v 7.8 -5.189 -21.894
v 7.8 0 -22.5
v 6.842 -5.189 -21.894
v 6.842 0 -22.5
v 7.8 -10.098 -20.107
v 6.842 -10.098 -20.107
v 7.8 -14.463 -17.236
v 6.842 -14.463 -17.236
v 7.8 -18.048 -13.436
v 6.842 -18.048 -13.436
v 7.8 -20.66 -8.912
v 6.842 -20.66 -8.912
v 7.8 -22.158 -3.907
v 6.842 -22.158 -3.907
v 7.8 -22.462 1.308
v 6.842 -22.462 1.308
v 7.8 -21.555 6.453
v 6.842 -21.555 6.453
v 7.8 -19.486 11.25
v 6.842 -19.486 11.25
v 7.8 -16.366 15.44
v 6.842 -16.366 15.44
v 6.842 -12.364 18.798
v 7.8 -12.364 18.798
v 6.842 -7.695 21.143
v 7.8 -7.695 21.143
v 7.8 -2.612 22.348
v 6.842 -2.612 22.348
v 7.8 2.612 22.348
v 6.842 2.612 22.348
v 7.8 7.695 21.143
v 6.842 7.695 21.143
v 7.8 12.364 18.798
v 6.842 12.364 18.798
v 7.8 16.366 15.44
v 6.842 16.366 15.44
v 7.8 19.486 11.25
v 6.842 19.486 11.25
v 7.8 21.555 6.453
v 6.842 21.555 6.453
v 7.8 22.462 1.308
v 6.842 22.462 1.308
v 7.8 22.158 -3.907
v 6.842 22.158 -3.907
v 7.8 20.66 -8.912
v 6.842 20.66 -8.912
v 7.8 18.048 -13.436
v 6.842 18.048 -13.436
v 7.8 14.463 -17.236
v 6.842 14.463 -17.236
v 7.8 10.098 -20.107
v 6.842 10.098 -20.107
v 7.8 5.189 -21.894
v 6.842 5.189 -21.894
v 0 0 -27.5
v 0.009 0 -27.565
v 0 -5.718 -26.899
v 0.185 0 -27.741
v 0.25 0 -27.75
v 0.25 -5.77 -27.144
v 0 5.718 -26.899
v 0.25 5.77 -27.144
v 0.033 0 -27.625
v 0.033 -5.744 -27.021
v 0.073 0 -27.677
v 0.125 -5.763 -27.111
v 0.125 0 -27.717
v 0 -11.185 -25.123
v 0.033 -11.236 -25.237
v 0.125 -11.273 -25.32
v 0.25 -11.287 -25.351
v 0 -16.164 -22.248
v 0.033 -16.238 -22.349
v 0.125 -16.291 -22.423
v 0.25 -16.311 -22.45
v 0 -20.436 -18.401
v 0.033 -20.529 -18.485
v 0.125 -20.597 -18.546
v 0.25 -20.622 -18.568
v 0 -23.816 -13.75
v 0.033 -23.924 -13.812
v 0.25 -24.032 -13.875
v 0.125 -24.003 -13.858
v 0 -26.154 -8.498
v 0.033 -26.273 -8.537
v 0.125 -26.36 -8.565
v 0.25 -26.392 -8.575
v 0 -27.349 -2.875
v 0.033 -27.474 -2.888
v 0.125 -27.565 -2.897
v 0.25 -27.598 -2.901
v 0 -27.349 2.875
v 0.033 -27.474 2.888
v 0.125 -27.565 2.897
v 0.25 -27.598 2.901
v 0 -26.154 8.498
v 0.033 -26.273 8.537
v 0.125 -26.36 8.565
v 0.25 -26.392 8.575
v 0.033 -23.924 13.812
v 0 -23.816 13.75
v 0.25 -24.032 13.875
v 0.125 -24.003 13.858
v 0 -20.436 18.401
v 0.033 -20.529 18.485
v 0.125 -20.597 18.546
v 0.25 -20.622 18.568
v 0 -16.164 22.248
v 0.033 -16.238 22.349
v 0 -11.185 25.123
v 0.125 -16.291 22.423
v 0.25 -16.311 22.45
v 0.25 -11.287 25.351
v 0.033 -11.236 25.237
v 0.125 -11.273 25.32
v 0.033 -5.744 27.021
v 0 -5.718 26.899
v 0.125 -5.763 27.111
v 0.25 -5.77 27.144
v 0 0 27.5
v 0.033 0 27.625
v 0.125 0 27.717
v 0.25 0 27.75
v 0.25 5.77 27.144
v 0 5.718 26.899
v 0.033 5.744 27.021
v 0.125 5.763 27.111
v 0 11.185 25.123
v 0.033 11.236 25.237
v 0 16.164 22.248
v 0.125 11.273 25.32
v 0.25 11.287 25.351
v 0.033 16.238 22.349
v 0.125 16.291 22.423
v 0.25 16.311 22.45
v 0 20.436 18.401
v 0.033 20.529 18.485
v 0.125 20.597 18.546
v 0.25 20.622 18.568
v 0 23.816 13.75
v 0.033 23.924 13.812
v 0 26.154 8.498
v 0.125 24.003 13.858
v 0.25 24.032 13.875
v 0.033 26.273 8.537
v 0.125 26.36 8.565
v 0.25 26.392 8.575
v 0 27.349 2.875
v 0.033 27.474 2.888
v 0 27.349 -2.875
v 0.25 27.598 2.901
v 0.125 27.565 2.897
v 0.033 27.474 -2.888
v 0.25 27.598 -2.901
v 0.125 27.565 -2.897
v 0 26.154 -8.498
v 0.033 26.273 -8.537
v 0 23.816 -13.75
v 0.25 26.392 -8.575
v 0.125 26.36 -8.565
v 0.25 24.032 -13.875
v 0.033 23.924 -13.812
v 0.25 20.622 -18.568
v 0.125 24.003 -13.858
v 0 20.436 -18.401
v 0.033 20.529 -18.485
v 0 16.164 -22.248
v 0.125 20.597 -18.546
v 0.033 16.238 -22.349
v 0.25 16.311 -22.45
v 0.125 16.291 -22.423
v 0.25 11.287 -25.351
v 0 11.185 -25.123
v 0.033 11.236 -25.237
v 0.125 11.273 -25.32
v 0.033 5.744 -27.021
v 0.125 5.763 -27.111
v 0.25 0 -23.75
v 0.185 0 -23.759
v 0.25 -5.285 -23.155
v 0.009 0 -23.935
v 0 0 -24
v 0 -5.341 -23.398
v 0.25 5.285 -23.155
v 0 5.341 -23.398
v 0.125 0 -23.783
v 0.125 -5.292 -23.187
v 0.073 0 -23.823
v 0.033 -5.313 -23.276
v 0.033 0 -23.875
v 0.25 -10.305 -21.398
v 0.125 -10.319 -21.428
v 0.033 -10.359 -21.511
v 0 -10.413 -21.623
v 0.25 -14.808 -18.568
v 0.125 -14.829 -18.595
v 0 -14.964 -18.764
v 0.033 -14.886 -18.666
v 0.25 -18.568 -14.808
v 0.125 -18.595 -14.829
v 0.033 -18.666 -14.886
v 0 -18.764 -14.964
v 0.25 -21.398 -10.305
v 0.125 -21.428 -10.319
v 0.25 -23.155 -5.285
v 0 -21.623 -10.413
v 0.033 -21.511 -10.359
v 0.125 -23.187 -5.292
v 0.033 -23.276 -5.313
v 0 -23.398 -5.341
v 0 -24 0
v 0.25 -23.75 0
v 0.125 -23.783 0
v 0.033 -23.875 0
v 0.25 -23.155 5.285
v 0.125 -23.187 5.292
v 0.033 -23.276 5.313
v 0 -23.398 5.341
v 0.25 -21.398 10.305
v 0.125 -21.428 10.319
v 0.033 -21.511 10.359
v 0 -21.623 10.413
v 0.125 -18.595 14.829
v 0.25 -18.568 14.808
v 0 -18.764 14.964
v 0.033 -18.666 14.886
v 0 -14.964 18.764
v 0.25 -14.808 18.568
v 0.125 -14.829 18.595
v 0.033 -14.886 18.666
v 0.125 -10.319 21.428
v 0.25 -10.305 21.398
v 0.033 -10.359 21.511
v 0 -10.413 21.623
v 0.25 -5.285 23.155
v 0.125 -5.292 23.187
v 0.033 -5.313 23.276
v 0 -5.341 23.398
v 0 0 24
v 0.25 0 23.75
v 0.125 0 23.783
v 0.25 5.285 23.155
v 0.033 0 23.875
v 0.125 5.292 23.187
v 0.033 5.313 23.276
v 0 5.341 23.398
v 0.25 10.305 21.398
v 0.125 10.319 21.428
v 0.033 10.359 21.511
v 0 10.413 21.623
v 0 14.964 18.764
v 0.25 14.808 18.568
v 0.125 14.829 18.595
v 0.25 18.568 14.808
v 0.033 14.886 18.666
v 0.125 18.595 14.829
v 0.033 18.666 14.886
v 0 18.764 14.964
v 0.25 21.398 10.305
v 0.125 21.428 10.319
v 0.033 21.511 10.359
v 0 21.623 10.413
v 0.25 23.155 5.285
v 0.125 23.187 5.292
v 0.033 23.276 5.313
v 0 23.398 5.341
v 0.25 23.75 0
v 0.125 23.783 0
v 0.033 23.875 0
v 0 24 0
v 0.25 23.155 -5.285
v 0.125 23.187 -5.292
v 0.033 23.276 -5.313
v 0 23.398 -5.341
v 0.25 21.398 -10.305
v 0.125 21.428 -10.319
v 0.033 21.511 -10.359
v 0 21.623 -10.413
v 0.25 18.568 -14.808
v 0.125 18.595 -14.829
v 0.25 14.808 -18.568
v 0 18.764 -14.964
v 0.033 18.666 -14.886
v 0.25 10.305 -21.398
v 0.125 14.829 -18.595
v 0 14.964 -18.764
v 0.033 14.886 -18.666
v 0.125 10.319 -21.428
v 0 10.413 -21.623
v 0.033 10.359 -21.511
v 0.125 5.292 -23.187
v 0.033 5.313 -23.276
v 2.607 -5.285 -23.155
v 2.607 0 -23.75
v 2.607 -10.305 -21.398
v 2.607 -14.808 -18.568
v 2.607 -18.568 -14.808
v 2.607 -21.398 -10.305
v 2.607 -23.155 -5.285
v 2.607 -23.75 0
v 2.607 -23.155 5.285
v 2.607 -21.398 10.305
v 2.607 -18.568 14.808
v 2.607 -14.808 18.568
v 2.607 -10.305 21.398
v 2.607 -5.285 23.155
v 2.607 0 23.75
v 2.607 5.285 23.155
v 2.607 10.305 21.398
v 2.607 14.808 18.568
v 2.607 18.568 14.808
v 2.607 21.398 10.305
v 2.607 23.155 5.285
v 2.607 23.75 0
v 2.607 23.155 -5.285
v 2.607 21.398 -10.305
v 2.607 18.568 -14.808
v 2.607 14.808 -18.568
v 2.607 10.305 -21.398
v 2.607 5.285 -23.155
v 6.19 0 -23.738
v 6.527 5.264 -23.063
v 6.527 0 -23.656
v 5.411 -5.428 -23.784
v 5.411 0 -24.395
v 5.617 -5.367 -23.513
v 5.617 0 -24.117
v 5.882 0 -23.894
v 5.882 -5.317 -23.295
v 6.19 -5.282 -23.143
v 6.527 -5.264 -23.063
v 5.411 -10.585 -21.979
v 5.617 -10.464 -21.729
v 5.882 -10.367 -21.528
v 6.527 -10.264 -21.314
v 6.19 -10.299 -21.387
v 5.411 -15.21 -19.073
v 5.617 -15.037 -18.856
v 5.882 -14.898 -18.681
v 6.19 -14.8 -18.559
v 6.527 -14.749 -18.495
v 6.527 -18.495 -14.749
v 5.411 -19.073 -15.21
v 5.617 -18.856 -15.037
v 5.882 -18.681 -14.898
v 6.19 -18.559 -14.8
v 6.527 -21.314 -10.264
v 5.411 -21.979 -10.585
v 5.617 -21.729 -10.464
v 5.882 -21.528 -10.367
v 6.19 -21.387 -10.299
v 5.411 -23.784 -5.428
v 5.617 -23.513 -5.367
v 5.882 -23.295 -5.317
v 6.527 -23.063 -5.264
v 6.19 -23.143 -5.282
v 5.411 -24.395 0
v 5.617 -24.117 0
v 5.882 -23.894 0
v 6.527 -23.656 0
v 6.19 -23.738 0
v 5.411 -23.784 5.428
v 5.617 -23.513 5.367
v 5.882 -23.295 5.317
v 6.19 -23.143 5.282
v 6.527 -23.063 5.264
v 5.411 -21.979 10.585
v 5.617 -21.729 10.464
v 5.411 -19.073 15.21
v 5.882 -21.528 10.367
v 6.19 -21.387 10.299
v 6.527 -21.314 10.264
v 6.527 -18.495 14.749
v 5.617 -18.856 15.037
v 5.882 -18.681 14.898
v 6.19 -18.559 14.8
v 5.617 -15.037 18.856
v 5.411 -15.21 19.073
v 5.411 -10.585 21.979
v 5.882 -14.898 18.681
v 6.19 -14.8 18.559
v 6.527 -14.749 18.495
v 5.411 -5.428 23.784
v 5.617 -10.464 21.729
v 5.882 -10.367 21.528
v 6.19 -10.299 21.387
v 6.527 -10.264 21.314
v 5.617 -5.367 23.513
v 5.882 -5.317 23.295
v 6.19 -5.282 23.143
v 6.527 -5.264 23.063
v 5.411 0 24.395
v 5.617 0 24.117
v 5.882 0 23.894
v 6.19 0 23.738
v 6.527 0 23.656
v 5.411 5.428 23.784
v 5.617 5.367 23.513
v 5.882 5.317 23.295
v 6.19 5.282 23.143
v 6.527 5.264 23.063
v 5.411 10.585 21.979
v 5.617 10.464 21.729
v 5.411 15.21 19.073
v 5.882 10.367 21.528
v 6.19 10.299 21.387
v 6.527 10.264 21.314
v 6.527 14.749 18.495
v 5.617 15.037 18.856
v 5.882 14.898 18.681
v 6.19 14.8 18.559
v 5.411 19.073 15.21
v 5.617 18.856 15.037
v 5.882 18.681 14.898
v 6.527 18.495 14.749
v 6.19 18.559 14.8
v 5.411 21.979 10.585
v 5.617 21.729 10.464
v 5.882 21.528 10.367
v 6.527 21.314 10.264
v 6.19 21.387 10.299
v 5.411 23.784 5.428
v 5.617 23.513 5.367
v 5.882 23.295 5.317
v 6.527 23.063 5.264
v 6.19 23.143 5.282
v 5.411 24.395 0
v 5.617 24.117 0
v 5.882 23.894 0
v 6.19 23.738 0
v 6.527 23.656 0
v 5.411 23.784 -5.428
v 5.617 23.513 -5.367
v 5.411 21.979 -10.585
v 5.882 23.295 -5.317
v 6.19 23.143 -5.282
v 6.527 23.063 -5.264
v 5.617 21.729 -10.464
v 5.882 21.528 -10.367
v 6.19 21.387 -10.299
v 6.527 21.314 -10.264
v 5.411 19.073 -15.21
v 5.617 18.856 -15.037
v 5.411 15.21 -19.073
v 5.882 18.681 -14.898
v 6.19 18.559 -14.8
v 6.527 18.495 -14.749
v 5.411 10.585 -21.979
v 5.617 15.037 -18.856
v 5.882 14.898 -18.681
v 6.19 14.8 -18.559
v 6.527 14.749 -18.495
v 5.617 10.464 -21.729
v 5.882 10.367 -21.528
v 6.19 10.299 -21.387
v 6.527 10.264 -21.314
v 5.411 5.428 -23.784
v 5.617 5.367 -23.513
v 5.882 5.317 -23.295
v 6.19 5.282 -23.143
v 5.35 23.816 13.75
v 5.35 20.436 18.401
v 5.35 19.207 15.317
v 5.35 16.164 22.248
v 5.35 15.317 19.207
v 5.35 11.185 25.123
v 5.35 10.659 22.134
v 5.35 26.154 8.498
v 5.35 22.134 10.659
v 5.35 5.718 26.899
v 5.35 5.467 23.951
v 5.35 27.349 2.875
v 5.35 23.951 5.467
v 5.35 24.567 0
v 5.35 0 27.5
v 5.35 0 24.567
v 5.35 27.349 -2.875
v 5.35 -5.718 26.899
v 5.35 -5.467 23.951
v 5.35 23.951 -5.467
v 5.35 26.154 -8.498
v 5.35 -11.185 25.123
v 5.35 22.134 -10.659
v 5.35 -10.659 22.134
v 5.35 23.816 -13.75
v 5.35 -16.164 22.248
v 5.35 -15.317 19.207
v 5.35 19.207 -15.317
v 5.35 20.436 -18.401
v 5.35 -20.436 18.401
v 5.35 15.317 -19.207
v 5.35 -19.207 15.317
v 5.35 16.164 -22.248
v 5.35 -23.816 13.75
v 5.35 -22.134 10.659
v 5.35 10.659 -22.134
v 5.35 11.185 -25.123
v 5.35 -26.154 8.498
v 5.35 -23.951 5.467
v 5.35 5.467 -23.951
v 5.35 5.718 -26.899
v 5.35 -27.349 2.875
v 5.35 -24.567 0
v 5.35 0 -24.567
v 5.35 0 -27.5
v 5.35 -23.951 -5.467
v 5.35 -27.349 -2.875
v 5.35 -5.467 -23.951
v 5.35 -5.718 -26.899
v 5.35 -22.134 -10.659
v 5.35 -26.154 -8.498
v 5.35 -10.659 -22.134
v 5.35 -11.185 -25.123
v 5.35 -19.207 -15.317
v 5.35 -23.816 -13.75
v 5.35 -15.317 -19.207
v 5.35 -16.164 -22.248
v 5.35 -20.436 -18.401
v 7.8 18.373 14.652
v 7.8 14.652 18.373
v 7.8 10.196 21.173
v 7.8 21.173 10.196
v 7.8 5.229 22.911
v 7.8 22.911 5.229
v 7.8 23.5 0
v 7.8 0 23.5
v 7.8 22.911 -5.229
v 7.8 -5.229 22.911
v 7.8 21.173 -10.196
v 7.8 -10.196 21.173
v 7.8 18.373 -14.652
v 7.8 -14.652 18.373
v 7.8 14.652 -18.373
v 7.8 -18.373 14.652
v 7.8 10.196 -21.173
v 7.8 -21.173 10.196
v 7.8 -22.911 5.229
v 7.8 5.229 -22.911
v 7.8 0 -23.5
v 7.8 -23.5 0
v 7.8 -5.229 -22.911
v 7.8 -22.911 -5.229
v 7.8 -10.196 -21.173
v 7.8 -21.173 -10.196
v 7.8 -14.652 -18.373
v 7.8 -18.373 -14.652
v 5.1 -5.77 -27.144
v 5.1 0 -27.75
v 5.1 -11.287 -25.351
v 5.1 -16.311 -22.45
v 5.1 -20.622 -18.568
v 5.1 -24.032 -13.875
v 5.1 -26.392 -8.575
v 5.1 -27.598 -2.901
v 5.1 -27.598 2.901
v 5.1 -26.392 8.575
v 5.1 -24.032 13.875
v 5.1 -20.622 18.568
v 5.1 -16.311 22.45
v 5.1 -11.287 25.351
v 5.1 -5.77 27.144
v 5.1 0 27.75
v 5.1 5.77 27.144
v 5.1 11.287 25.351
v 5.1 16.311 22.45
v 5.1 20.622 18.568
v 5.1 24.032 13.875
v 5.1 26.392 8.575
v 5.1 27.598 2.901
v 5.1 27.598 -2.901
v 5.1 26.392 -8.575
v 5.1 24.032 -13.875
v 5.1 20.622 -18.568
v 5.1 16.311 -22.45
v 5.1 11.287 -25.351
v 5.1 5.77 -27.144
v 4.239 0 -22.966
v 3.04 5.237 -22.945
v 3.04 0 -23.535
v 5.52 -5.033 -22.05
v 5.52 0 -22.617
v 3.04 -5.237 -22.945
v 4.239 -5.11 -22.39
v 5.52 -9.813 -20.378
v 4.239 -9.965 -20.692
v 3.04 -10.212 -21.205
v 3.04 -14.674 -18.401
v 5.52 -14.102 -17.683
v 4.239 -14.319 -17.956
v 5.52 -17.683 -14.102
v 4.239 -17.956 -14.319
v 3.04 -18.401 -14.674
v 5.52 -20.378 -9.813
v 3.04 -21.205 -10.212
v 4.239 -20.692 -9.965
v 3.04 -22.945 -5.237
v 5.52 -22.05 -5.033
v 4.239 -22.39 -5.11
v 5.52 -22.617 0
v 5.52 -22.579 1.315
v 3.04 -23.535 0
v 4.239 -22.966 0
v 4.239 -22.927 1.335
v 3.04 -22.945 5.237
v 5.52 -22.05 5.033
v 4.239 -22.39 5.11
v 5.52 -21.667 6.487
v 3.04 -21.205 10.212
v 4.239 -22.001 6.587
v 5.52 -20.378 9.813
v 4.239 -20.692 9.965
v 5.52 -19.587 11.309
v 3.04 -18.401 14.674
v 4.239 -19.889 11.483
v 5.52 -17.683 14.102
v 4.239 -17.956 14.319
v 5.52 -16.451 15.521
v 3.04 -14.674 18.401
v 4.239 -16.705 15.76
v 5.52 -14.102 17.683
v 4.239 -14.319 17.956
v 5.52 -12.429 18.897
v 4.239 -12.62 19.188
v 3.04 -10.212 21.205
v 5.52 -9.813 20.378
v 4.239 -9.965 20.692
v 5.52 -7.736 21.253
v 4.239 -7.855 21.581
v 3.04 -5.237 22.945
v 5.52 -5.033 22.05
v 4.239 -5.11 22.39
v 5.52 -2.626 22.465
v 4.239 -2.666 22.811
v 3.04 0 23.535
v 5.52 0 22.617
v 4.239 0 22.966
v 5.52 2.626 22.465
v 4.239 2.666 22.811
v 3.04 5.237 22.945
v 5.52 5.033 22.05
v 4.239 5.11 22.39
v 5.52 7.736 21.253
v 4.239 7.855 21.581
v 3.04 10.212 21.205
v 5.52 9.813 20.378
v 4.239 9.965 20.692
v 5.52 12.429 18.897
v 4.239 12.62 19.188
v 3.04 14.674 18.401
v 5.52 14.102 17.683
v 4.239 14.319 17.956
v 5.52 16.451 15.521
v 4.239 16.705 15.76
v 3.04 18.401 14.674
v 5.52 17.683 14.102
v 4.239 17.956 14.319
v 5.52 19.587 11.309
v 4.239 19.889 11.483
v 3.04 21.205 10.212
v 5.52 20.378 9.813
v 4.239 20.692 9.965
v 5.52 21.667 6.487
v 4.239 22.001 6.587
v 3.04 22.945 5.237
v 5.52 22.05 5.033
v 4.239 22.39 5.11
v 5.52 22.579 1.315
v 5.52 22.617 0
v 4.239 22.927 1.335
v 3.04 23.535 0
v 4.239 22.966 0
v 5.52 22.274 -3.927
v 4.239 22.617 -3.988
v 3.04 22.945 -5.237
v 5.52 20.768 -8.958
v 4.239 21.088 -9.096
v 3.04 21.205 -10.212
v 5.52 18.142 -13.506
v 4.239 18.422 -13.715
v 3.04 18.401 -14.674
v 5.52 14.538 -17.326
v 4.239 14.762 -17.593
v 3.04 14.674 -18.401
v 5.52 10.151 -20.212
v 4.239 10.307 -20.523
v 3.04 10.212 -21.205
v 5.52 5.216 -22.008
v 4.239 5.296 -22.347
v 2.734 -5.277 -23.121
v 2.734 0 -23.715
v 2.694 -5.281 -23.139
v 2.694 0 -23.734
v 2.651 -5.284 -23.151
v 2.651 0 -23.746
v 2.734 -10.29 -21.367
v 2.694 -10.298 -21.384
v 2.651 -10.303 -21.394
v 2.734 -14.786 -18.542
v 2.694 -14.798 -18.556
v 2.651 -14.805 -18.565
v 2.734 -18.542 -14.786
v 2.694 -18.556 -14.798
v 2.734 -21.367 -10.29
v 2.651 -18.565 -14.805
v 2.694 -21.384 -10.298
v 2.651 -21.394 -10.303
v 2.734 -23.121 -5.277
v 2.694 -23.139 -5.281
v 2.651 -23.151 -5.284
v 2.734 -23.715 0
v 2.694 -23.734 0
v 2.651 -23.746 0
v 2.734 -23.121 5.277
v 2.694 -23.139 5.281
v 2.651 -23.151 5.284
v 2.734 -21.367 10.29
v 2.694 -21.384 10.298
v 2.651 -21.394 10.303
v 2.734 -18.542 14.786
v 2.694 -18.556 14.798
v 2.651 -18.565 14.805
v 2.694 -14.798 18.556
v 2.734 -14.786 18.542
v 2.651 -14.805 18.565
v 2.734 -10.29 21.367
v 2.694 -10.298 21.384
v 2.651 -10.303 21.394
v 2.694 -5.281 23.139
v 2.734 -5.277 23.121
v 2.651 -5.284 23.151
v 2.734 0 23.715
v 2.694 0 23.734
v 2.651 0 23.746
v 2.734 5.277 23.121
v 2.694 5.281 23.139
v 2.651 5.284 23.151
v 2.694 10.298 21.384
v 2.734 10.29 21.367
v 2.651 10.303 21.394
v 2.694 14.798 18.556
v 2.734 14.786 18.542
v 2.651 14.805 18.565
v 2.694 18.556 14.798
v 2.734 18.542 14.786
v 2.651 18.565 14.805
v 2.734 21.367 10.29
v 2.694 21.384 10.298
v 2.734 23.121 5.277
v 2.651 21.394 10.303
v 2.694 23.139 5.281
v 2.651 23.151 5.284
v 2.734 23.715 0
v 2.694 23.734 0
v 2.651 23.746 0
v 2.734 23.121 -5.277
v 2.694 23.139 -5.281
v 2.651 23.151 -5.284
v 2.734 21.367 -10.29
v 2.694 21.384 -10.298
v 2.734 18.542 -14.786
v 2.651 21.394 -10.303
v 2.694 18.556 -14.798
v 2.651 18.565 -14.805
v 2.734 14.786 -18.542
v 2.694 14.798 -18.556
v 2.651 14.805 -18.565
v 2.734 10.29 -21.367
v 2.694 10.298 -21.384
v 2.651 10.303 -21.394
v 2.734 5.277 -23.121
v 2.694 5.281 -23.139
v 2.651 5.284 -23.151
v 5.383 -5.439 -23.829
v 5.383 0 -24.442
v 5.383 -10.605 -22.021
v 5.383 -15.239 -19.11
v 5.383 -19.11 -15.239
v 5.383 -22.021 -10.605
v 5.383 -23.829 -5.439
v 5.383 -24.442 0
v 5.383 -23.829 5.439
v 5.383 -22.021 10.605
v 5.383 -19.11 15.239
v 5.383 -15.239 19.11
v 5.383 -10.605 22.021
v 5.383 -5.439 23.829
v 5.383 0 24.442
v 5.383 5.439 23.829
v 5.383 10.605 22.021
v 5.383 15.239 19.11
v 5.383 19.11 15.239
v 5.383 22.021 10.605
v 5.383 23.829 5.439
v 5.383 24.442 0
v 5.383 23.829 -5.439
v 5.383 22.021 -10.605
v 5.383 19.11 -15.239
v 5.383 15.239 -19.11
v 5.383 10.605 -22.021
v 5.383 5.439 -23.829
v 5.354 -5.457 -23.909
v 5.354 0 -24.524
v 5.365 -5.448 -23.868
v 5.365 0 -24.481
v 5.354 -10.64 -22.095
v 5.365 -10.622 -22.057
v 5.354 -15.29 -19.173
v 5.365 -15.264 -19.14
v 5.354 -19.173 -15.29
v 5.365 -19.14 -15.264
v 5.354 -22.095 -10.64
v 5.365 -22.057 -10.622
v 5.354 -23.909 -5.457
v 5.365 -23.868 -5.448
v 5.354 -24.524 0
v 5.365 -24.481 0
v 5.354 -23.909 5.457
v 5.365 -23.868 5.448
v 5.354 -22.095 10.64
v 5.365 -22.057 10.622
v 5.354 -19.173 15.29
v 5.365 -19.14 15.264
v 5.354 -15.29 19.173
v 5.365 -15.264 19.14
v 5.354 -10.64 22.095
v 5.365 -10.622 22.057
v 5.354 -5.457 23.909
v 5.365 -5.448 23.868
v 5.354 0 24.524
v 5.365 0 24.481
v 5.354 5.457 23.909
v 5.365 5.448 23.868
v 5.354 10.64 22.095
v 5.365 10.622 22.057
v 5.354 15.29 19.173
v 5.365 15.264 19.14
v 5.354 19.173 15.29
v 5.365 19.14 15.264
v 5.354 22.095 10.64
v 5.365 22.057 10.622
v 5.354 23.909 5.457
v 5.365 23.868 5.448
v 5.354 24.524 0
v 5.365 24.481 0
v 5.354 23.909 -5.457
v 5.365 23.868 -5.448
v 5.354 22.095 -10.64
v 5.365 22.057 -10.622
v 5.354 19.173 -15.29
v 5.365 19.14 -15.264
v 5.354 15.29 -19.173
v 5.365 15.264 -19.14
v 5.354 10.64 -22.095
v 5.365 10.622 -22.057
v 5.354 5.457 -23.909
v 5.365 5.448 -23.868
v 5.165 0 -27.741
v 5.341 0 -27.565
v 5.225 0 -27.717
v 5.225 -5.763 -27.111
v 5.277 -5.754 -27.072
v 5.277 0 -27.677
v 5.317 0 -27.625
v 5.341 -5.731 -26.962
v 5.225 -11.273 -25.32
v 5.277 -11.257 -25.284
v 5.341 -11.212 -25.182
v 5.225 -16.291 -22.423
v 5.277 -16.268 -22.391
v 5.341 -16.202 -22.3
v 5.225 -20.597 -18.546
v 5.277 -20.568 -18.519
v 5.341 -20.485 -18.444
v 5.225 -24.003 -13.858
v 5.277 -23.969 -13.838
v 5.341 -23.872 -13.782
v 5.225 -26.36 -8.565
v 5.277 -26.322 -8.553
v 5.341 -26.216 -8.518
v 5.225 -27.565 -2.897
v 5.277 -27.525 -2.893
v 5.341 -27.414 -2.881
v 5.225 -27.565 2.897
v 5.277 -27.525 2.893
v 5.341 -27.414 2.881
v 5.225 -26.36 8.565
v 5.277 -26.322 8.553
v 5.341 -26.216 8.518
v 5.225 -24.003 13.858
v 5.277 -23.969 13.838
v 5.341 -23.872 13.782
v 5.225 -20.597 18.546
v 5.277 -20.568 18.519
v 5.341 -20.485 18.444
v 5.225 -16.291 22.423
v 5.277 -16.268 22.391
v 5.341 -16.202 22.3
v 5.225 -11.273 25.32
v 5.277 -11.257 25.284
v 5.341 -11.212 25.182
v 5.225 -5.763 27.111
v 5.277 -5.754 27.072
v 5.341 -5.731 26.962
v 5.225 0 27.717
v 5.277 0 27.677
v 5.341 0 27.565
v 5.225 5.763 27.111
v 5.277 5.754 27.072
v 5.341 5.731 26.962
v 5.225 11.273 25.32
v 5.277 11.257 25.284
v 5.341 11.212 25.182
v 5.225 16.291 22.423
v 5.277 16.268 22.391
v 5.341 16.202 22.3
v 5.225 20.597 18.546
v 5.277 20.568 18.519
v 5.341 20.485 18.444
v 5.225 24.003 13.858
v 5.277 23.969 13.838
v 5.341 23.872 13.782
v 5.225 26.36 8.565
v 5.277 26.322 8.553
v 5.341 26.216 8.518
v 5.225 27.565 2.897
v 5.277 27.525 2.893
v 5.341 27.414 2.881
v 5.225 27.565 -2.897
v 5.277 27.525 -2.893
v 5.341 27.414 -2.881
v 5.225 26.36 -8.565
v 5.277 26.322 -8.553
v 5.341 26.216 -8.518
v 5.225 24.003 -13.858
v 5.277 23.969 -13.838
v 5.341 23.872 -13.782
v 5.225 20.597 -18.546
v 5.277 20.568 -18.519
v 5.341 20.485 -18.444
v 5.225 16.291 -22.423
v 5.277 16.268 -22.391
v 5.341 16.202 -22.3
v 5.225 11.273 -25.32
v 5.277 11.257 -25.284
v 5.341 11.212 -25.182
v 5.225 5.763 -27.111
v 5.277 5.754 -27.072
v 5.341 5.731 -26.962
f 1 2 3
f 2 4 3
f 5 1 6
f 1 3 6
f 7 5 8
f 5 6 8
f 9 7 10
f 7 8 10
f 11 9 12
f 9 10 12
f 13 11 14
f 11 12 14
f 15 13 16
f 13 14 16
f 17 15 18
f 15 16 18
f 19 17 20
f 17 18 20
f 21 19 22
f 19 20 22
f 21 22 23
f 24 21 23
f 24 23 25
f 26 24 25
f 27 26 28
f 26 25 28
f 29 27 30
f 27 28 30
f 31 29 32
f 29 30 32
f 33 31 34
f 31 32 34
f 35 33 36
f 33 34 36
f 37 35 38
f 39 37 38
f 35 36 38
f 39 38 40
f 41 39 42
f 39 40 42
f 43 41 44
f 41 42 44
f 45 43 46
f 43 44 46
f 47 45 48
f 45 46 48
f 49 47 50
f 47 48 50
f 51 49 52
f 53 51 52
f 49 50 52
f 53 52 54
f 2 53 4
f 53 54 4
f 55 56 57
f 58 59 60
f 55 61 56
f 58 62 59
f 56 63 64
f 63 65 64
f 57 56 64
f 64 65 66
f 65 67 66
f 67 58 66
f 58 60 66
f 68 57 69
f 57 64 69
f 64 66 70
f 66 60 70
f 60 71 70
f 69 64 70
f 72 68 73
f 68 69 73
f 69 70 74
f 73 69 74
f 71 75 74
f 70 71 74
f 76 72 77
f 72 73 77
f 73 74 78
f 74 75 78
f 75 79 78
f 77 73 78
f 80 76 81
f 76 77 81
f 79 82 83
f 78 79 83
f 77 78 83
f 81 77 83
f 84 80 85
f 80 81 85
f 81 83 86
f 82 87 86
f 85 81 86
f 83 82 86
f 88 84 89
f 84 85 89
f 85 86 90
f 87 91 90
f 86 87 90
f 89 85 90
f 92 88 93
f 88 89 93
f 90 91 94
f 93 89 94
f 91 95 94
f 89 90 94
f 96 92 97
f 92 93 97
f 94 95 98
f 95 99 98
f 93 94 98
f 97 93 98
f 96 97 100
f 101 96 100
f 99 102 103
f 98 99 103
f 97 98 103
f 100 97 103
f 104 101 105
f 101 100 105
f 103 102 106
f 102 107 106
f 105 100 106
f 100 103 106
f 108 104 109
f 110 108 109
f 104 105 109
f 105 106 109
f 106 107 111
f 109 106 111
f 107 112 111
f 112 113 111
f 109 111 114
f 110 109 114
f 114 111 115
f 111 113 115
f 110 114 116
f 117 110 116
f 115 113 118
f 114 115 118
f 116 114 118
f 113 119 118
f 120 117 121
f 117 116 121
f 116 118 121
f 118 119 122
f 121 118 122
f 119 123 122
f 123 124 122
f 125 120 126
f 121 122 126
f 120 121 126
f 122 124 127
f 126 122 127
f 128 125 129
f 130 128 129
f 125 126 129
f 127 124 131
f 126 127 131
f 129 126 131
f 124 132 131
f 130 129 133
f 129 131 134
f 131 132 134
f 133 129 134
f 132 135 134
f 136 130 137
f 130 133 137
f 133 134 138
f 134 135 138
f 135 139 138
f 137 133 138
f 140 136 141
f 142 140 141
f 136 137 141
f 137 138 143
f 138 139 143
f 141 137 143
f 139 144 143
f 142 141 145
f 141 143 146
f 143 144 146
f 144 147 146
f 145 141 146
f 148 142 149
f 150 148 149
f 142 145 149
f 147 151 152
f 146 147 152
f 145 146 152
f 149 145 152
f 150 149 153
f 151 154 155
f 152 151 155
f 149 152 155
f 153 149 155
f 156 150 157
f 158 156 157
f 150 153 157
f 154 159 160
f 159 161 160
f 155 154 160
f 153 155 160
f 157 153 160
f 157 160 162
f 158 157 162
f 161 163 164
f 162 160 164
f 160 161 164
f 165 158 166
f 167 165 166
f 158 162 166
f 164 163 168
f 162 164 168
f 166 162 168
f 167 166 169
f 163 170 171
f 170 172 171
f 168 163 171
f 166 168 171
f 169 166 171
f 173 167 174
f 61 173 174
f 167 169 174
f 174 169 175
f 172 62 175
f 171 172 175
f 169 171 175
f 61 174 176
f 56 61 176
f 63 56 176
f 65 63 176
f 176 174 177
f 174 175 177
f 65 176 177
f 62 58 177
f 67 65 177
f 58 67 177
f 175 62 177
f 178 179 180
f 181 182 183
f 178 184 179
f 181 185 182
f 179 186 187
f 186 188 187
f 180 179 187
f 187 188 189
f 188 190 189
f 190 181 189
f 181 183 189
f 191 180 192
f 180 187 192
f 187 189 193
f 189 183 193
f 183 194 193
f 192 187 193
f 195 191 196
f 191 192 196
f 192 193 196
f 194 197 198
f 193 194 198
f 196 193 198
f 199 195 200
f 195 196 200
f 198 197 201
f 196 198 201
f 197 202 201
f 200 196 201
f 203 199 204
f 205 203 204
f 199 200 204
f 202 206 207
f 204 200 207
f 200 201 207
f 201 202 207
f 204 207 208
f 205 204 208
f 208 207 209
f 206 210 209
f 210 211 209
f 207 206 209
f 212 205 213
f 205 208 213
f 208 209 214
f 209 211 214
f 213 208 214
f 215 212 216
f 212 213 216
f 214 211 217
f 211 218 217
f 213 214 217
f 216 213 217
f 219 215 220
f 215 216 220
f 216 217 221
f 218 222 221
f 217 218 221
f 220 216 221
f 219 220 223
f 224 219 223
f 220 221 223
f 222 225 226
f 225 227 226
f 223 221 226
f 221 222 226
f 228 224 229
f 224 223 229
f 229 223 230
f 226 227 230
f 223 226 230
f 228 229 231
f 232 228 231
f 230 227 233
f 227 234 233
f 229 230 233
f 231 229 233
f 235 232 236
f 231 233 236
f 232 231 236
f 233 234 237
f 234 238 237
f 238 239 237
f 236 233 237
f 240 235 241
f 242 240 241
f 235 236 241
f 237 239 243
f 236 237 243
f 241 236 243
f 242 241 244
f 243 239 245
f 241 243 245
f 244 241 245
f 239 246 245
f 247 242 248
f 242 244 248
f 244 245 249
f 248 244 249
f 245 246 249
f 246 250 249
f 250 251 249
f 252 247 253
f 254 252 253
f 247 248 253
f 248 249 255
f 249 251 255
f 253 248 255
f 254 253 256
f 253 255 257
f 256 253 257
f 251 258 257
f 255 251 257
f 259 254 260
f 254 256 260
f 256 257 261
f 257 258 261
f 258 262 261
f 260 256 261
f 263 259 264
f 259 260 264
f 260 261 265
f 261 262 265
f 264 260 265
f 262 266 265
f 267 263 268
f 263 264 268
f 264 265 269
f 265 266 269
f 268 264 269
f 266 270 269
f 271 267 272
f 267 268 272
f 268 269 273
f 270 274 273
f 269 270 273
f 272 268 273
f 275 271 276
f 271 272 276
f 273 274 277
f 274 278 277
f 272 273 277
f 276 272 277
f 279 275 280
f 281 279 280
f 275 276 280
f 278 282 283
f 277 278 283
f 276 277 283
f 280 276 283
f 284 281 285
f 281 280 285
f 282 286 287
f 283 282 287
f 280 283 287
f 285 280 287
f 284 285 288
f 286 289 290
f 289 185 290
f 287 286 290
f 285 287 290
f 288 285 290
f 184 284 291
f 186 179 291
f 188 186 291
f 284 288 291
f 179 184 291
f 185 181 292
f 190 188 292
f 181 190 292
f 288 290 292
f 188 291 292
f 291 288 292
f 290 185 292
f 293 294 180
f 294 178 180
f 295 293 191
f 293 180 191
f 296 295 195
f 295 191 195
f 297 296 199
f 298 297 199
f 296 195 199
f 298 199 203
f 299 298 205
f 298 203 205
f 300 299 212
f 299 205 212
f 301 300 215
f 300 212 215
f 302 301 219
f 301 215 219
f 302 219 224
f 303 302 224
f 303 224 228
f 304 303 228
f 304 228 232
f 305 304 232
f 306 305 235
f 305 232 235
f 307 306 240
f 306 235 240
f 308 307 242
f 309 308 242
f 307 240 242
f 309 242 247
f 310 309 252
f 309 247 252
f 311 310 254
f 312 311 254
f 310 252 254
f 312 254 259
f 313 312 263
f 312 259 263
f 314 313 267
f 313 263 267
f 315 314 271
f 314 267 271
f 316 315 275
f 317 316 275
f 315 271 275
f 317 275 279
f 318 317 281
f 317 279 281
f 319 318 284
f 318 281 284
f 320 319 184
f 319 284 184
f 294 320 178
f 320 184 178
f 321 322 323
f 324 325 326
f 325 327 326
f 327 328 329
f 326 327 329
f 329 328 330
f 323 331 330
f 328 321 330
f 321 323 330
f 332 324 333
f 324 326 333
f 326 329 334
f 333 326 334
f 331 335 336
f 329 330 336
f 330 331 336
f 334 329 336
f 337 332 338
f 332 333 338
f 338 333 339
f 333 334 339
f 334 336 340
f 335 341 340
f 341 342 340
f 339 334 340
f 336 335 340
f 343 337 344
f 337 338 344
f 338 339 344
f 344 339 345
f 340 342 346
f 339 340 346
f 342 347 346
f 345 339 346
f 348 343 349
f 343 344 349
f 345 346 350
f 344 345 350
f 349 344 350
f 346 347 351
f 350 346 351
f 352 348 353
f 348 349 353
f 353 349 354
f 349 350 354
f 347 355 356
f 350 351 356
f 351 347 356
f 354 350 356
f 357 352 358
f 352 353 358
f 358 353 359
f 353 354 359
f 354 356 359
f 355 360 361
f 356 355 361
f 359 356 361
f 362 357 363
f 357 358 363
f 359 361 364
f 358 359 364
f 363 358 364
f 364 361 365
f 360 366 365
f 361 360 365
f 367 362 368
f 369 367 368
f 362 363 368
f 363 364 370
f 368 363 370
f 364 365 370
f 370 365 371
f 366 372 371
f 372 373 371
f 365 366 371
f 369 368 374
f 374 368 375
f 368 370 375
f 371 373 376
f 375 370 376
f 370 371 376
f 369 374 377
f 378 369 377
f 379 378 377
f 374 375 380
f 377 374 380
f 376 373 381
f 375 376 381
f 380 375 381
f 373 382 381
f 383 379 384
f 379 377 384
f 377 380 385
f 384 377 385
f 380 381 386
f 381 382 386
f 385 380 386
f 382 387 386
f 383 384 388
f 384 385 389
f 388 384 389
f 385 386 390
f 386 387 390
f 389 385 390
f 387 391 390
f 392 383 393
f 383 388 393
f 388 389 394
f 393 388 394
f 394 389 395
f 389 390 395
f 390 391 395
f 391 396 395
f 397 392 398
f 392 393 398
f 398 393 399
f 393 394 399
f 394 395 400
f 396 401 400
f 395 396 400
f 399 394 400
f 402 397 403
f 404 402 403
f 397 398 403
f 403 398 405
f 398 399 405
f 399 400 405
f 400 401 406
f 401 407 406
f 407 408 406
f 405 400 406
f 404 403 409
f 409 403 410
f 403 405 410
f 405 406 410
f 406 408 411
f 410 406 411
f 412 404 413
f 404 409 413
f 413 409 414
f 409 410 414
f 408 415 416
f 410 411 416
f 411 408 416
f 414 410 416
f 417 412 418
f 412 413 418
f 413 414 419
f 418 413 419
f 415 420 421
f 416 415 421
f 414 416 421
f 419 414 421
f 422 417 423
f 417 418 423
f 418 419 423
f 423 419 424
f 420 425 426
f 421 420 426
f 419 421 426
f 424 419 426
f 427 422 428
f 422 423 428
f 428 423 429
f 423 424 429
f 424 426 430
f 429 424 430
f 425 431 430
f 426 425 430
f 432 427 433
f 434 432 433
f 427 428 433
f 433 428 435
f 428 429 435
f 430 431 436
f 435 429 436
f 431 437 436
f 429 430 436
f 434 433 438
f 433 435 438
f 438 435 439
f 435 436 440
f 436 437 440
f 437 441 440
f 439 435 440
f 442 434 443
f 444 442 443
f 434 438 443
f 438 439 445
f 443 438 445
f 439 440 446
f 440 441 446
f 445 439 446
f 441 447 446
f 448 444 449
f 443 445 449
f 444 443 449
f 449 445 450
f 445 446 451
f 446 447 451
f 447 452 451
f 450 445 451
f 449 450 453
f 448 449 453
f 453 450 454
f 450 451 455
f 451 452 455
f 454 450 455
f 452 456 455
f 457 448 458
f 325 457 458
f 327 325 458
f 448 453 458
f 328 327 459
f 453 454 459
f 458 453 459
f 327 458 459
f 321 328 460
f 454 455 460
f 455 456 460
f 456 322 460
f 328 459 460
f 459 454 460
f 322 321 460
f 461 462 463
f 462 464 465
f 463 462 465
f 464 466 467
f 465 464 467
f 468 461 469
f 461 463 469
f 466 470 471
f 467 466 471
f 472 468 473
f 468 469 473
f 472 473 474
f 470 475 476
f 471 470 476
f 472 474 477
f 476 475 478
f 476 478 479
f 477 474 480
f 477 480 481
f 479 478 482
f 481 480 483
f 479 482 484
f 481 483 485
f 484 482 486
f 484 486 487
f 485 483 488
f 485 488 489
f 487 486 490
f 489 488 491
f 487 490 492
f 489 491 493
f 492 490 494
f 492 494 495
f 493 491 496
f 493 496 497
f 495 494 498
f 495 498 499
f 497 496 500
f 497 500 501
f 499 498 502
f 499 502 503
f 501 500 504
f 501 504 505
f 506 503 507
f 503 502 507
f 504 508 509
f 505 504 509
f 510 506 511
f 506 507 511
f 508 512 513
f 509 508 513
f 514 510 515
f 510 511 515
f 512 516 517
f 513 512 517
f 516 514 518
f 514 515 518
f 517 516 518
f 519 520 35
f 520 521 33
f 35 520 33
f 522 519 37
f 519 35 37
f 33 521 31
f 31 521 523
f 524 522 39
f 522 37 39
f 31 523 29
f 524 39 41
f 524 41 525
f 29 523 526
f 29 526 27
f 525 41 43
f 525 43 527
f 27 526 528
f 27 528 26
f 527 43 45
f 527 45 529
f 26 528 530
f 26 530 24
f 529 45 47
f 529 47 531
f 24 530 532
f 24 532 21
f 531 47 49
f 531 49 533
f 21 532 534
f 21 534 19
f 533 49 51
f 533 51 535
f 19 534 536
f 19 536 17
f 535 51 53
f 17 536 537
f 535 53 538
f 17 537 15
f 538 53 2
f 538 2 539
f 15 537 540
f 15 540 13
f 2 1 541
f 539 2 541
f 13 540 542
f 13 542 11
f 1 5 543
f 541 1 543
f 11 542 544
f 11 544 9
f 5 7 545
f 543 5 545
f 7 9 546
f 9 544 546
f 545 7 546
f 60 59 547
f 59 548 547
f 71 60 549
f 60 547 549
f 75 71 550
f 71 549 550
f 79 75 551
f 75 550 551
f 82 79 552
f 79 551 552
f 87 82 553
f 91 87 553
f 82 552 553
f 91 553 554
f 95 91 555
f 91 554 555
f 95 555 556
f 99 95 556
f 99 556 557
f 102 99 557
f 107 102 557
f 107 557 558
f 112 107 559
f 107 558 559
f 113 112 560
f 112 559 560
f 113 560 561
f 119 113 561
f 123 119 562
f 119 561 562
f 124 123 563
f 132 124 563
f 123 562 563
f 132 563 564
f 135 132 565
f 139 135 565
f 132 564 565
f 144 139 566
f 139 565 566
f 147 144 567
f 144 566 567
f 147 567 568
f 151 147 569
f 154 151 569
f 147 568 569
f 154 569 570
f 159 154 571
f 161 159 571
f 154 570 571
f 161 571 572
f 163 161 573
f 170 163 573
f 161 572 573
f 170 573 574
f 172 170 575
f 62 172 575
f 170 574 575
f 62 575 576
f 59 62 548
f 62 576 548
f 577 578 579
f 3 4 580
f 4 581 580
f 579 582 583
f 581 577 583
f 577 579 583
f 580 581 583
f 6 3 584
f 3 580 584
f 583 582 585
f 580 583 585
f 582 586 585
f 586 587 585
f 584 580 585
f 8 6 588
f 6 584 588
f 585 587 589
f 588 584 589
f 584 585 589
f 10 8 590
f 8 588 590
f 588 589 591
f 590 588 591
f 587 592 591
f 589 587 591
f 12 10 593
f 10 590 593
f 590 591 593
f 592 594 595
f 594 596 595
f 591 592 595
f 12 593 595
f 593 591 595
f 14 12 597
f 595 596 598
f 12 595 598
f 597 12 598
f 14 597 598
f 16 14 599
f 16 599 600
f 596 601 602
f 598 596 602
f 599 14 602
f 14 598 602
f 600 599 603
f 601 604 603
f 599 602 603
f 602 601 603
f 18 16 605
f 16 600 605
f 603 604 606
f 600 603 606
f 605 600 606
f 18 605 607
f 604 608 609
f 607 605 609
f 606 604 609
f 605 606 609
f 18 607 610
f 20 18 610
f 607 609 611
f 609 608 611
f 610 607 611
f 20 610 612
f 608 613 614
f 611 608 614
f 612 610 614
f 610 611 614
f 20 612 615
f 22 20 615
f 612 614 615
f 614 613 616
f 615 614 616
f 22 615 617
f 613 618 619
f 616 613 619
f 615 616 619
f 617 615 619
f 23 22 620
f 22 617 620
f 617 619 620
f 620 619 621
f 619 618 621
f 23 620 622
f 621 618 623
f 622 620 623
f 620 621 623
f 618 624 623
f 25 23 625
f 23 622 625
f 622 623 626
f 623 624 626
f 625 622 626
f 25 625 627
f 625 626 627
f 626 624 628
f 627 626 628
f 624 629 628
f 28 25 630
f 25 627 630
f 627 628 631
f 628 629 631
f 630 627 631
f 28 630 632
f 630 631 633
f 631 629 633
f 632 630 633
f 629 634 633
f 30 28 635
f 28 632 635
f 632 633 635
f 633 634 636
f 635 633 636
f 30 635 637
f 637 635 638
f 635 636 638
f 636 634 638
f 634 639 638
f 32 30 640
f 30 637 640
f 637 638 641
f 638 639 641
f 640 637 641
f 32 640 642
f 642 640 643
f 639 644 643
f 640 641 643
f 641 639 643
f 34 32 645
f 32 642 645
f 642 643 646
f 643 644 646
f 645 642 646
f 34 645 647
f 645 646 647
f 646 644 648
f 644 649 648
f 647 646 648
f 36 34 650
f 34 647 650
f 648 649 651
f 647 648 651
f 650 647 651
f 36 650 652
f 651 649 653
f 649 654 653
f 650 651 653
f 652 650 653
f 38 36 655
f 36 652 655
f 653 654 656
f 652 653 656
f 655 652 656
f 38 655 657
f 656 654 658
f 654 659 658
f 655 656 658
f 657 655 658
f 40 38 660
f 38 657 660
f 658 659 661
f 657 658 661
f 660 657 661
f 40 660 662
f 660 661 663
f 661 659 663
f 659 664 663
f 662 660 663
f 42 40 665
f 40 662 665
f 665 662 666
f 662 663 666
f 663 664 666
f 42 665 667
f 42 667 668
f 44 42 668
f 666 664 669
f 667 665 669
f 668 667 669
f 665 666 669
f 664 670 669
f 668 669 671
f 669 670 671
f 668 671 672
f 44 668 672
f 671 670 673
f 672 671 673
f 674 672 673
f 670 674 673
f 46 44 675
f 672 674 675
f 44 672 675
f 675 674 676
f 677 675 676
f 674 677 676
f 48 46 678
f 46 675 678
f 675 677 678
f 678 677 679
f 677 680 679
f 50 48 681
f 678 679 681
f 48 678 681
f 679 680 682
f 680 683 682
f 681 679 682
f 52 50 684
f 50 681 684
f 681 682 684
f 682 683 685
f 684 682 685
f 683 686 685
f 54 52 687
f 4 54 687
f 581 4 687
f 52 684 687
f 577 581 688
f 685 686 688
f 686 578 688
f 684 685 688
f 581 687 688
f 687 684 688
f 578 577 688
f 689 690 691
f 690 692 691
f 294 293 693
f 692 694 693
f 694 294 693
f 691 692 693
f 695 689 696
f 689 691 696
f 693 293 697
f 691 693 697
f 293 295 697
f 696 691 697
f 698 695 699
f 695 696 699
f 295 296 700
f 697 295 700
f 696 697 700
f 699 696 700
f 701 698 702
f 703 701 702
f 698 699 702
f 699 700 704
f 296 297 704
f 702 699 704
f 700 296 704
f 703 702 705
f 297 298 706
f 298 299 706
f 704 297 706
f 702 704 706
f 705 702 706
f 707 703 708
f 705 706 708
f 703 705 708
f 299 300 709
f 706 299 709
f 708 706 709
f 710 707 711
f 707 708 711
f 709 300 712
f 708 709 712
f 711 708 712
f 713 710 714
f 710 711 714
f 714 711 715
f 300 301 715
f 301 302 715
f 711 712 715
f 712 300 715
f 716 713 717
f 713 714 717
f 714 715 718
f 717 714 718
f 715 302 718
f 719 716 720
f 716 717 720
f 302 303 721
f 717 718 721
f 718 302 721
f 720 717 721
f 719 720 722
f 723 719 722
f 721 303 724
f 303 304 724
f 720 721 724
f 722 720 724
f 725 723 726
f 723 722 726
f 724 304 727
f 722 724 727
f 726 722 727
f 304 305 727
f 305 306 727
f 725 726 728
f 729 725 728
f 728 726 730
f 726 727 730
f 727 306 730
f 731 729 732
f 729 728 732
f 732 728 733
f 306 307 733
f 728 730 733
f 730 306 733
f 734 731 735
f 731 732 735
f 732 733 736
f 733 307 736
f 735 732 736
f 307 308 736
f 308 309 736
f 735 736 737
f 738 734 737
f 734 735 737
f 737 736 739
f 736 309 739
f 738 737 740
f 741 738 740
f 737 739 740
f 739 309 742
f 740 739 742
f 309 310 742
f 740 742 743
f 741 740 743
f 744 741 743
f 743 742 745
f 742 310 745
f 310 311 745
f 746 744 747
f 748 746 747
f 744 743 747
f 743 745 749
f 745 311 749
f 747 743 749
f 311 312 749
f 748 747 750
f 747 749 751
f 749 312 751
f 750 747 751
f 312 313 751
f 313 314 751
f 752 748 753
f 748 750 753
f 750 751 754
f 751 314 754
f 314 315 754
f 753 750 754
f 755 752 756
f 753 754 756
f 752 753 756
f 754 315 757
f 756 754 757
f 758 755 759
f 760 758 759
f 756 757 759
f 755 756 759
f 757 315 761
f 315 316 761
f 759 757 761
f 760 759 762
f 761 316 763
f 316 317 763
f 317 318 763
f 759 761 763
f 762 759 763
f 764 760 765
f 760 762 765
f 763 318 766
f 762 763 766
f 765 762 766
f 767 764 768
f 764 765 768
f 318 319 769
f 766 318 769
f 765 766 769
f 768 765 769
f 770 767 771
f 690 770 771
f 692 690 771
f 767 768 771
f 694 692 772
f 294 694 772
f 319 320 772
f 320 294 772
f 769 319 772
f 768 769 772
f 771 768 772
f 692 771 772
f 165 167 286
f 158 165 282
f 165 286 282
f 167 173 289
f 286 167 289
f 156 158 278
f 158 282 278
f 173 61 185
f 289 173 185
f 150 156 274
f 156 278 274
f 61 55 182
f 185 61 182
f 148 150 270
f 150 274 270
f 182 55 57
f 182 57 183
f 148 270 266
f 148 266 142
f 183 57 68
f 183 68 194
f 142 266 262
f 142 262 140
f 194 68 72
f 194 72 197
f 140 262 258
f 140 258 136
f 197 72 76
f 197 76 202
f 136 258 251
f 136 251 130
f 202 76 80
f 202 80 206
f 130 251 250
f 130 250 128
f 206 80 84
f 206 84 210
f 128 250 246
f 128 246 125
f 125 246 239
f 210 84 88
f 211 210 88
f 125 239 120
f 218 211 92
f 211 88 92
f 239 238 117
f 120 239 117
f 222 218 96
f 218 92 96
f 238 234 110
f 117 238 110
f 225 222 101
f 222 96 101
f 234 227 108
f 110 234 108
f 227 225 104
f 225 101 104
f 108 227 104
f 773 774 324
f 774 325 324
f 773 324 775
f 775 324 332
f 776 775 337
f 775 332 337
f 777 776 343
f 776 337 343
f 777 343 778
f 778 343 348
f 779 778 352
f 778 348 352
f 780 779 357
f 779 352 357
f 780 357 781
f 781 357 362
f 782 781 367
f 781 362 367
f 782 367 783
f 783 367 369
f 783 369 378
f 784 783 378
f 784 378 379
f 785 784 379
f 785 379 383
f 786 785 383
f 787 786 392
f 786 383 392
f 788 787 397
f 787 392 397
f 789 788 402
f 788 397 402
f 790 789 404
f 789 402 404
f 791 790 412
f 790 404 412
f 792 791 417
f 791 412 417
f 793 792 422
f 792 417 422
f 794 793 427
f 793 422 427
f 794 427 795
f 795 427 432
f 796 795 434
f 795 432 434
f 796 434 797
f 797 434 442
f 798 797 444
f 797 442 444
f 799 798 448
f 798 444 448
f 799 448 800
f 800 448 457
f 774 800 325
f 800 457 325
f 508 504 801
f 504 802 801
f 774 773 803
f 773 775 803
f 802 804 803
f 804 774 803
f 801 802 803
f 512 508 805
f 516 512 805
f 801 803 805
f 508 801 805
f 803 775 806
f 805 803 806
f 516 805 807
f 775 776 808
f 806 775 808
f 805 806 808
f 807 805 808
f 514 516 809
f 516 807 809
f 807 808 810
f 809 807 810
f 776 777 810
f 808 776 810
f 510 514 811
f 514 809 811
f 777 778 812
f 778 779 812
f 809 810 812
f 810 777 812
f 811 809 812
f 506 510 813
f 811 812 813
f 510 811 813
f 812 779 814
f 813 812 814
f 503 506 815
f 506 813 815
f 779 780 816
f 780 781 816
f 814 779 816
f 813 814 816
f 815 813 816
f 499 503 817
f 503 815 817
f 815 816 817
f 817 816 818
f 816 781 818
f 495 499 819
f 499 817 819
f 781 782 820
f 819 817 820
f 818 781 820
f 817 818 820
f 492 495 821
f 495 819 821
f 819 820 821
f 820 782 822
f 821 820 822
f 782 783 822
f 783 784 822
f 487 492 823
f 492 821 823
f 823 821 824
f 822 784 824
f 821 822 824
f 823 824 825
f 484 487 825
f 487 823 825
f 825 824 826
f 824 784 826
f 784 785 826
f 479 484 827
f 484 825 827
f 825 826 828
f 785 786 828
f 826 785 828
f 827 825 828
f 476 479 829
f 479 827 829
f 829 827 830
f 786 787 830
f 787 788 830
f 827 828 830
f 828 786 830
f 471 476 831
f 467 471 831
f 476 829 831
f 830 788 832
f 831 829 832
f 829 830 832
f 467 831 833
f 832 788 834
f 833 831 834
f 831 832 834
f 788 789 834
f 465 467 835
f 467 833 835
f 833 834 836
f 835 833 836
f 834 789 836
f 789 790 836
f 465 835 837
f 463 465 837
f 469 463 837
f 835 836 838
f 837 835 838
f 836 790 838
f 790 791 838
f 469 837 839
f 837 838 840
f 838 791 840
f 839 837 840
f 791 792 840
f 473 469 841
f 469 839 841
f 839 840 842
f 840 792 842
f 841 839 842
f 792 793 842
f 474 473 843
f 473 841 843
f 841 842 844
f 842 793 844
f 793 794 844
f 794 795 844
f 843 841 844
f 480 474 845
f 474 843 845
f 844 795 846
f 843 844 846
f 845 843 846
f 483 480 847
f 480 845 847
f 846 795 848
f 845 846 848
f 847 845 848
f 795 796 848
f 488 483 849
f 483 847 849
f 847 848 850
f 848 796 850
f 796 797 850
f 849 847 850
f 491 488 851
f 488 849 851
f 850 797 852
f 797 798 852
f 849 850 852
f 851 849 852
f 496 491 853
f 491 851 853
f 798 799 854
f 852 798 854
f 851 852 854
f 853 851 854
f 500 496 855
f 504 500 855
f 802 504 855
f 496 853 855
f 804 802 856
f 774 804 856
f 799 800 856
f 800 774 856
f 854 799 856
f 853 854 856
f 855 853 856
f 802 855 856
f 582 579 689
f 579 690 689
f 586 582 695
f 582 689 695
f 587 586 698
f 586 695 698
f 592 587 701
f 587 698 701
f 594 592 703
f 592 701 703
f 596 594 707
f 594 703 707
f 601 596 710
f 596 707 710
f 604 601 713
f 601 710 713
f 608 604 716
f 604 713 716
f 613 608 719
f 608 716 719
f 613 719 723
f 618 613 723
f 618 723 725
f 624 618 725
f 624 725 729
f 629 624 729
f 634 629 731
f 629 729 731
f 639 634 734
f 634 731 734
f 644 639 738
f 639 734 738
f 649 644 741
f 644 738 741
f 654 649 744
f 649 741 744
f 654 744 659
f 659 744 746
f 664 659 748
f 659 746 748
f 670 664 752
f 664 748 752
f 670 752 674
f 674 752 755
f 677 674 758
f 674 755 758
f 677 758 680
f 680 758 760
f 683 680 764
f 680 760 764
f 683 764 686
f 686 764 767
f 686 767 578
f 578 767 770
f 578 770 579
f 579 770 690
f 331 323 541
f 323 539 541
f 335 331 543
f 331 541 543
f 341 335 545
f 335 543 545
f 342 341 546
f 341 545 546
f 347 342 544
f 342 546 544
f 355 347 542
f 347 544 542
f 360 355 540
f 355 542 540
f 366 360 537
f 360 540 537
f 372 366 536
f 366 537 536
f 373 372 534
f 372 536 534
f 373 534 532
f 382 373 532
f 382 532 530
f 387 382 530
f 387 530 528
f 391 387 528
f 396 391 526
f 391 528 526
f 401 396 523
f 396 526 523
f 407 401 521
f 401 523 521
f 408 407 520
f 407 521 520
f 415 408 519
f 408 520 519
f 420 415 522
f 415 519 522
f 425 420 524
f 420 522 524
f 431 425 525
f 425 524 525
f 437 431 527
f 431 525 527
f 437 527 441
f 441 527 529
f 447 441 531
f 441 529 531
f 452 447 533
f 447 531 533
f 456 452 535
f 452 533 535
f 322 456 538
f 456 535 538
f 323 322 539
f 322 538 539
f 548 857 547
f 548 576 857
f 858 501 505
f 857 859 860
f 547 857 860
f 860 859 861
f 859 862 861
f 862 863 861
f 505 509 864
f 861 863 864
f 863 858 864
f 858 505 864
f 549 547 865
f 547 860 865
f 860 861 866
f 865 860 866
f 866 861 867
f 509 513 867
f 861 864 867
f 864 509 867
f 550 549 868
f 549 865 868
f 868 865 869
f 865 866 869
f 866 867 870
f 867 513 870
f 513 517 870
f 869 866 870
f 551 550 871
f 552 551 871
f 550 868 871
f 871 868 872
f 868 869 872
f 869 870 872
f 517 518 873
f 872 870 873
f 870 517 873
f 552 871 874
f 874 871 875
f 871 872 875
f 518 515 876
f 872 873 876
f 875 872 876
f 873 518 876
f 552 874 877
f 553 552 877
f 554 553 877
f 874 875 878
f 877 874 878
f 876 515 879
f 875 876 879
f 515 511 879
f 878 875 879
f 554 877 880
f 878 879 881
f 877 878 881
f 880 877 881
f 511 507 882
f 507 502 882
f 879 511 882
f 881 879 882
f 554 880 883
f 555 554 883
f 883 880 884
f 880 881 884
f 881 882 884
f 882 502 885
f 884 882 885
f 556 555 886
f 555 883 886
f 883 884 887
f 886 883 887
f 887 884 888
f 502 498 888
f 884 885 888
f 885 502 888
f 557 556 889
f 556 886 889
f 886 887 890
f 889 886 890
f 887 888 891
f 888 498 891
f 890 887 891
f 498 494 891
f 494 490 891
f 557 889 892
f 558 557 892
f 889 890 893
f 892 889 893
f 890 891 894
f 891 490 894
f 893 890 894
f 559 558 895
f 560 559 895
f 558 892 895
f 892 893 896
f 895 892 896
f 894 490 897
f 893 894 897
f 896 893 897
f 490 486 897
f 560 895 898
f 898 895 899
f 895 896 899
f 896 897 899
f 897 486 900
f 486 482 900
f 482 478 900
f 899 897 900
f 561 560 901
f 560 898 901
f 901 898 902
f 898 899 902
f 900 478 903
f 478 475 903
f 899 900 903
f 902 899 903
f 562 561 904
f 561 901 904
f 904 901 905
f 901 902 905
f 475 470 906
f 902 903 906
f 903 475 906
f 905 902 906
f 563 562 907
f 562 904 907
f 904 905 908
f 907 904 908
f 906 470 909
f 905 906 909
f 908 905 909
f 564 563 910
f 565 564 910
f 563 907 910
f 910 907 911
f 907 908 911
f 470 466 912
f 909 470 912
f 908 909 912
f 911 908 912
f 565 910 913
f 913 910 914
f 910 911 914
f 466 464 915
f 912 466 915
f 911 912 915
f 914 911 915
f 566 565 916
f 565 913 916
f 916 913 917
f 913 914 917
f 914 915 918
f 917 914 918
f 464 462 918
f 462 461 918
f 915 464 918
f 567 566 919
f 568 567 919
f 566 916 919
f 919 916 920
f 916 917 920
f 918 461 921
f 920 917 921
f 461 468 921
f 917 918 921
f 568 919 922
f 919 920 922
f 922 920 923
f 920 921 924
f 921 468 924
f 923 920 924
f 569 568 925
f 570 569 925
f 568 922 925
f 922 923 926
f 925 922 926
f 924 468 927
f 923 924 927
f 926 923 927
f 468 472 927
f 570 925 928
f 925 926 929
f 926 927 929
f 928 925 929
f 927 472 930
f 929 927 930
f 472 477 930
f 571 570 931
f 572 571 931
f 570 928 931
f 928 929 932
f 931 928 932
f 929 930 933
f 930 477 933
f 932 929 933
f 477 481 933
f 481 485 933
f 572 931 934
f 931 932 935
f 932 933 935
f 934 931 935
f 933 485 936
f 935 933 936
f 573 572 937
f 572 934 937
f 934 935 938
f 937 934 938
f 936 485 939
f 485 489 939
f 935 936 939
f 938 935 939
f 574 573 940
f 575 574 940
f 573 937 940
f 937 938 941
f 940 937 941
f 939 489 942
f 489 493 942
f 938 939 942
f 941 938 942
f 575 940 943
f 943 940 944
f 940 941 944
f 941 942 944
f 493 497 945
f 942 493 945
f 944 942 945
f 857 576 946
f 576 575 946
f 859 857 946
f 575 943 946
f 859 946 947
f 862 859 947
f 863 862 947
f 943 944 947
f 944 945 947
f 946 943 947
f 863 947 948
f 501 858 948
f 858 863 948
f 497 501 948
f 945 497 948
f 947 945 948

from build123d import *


with BuildPart() as part:
    # Sketch1 → Revolve1 (revolve)
    with BuildSketch(Plane(origin=(0, 0, 0), x_dir=(1, 0, 0), z_dir=(0, 1, 0))):
        with BuildLine():
            Line((7.8, 23.5), (7.8, 22.5))
            Line((7.8, 22.5), (6.842312192, 22.5))
            ThreePointArc((6.842312192, 22.5), (4.871753846, 22.763502242), (3.039661243, 23.535493386))
            Line((3.039661243, 23.535493386), (2.733677959, 23.715483554))
            ThreePointArc((2.733677959, 23.715483554), (2.672608205, 23.741216592), (2.606922927, 23.75))
            Line((2.606922927, 23.75), (0.25, 23.75))
            ThreePointArc((0.25, 23.75), (0.073223305, 23.823223305), (0, 24))
            Line((0, 24), (0, 27.5))
            ThreePointArc((0, 27.5), (0.073223305, 27.676776695), (0.25, 27.75))
            Line((0.25, 27.75), (5.1, 27.75))
            ThreePointArc((5.1, 27.75), (5.276776695, 27.676776695), (5.35, 27.5))
            Line((5.35, 27.5), (5.35, 24.566987298))
            ThreePointArc((5.35, 24.566987298), (5.358518543, 24.502282537), (5.383493649, 24.441987298))
            Line((5.383493649, 24.441987298), (5.410533744, 24.39515248))
            ThreePointArc((5.410533744, 24.39515248), (5.881666372, 23.894323747), (6.526767835, 23.656333252))
            Line((6.526767835, 23.656333252), (7.8, 23.5))
        make_face()
    revolve(axis=Axis((88.99, 0, 0), (-1, 0, 0)))


solid = part.part
